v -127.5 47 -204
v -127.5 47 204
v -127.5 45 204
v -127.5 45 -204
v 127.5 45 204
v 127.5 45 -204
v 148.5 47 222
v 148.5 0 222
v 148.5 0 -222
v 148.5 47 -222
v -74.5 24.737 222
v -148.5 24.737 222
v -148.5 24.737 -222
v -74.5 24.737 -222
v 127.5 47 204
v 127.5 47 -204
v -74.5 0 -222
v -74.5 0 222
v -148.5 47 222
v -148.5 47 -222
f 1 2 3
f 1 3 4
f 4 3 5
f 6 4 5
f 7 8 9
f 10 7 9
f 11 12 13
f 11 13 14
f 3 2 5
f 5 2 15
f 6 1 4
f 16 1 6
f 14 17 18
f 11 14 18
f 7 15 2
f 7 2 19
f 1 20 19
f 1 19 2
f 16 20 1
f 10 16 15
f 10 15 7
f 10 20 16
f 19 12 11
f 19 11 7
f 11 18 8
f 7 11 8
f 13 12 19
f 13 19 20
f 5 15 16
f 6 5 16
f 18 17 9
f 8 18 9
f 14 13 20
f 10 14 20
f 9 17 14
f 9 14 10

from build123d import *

# Parameters (mm, degrees)
SKETCH_1_W          = 297
SKETCH_1_H          = 444
EXTRUDE_1_DEPTH     = 47
SKETCH_2_W          = 255
SKETCH_2_H          = 408
CUT_EXTRUDE_1_DEPTH = 2
SKETCH_3_W          = 74
SKETCH_3_H          = 444
CUT_EXTRUDE_2_DEPTH = 24.736842105


with BuildPart() as part:
    # 草圖1 → 填料-伸長1 (new body)
    with BuildSketch(Plane(origin=(0, 0, 0), x_dir=(1, 0, 0), z_dir=(0, 1, 0))):
        Rectangle(SKETCH_1_W, SKETCH_1_H)
    extrude(amount=EXTRUDE_1_DEPTH)

    # 草圖2 → 除料-伸長1 (cut)
    with BuildSketch(Plane(origin=(0, 47, 0), x_dir=(1, 0, 0), z_dir=(0, 1, 0))):
        Rectangle(SKETCH_2_W, SKETCH_2_H)
    extrude(amount=-CUT_EXTRUDE_1_DEPTH, mode=Mode.SUBTRACT)

    # 草圖3 → 除料-伸長2 (cut)
    with BuildSketch(Plane.XZ):
        with Locations((-111.5, 0)):
            Rectangle(SKETCH_3_W, SKETCH_3_H)
    extrude(amount=-CUT_EXTRUDE_2_DEPTH, mode=Mode.SUBTRACT)


solid = part.part
